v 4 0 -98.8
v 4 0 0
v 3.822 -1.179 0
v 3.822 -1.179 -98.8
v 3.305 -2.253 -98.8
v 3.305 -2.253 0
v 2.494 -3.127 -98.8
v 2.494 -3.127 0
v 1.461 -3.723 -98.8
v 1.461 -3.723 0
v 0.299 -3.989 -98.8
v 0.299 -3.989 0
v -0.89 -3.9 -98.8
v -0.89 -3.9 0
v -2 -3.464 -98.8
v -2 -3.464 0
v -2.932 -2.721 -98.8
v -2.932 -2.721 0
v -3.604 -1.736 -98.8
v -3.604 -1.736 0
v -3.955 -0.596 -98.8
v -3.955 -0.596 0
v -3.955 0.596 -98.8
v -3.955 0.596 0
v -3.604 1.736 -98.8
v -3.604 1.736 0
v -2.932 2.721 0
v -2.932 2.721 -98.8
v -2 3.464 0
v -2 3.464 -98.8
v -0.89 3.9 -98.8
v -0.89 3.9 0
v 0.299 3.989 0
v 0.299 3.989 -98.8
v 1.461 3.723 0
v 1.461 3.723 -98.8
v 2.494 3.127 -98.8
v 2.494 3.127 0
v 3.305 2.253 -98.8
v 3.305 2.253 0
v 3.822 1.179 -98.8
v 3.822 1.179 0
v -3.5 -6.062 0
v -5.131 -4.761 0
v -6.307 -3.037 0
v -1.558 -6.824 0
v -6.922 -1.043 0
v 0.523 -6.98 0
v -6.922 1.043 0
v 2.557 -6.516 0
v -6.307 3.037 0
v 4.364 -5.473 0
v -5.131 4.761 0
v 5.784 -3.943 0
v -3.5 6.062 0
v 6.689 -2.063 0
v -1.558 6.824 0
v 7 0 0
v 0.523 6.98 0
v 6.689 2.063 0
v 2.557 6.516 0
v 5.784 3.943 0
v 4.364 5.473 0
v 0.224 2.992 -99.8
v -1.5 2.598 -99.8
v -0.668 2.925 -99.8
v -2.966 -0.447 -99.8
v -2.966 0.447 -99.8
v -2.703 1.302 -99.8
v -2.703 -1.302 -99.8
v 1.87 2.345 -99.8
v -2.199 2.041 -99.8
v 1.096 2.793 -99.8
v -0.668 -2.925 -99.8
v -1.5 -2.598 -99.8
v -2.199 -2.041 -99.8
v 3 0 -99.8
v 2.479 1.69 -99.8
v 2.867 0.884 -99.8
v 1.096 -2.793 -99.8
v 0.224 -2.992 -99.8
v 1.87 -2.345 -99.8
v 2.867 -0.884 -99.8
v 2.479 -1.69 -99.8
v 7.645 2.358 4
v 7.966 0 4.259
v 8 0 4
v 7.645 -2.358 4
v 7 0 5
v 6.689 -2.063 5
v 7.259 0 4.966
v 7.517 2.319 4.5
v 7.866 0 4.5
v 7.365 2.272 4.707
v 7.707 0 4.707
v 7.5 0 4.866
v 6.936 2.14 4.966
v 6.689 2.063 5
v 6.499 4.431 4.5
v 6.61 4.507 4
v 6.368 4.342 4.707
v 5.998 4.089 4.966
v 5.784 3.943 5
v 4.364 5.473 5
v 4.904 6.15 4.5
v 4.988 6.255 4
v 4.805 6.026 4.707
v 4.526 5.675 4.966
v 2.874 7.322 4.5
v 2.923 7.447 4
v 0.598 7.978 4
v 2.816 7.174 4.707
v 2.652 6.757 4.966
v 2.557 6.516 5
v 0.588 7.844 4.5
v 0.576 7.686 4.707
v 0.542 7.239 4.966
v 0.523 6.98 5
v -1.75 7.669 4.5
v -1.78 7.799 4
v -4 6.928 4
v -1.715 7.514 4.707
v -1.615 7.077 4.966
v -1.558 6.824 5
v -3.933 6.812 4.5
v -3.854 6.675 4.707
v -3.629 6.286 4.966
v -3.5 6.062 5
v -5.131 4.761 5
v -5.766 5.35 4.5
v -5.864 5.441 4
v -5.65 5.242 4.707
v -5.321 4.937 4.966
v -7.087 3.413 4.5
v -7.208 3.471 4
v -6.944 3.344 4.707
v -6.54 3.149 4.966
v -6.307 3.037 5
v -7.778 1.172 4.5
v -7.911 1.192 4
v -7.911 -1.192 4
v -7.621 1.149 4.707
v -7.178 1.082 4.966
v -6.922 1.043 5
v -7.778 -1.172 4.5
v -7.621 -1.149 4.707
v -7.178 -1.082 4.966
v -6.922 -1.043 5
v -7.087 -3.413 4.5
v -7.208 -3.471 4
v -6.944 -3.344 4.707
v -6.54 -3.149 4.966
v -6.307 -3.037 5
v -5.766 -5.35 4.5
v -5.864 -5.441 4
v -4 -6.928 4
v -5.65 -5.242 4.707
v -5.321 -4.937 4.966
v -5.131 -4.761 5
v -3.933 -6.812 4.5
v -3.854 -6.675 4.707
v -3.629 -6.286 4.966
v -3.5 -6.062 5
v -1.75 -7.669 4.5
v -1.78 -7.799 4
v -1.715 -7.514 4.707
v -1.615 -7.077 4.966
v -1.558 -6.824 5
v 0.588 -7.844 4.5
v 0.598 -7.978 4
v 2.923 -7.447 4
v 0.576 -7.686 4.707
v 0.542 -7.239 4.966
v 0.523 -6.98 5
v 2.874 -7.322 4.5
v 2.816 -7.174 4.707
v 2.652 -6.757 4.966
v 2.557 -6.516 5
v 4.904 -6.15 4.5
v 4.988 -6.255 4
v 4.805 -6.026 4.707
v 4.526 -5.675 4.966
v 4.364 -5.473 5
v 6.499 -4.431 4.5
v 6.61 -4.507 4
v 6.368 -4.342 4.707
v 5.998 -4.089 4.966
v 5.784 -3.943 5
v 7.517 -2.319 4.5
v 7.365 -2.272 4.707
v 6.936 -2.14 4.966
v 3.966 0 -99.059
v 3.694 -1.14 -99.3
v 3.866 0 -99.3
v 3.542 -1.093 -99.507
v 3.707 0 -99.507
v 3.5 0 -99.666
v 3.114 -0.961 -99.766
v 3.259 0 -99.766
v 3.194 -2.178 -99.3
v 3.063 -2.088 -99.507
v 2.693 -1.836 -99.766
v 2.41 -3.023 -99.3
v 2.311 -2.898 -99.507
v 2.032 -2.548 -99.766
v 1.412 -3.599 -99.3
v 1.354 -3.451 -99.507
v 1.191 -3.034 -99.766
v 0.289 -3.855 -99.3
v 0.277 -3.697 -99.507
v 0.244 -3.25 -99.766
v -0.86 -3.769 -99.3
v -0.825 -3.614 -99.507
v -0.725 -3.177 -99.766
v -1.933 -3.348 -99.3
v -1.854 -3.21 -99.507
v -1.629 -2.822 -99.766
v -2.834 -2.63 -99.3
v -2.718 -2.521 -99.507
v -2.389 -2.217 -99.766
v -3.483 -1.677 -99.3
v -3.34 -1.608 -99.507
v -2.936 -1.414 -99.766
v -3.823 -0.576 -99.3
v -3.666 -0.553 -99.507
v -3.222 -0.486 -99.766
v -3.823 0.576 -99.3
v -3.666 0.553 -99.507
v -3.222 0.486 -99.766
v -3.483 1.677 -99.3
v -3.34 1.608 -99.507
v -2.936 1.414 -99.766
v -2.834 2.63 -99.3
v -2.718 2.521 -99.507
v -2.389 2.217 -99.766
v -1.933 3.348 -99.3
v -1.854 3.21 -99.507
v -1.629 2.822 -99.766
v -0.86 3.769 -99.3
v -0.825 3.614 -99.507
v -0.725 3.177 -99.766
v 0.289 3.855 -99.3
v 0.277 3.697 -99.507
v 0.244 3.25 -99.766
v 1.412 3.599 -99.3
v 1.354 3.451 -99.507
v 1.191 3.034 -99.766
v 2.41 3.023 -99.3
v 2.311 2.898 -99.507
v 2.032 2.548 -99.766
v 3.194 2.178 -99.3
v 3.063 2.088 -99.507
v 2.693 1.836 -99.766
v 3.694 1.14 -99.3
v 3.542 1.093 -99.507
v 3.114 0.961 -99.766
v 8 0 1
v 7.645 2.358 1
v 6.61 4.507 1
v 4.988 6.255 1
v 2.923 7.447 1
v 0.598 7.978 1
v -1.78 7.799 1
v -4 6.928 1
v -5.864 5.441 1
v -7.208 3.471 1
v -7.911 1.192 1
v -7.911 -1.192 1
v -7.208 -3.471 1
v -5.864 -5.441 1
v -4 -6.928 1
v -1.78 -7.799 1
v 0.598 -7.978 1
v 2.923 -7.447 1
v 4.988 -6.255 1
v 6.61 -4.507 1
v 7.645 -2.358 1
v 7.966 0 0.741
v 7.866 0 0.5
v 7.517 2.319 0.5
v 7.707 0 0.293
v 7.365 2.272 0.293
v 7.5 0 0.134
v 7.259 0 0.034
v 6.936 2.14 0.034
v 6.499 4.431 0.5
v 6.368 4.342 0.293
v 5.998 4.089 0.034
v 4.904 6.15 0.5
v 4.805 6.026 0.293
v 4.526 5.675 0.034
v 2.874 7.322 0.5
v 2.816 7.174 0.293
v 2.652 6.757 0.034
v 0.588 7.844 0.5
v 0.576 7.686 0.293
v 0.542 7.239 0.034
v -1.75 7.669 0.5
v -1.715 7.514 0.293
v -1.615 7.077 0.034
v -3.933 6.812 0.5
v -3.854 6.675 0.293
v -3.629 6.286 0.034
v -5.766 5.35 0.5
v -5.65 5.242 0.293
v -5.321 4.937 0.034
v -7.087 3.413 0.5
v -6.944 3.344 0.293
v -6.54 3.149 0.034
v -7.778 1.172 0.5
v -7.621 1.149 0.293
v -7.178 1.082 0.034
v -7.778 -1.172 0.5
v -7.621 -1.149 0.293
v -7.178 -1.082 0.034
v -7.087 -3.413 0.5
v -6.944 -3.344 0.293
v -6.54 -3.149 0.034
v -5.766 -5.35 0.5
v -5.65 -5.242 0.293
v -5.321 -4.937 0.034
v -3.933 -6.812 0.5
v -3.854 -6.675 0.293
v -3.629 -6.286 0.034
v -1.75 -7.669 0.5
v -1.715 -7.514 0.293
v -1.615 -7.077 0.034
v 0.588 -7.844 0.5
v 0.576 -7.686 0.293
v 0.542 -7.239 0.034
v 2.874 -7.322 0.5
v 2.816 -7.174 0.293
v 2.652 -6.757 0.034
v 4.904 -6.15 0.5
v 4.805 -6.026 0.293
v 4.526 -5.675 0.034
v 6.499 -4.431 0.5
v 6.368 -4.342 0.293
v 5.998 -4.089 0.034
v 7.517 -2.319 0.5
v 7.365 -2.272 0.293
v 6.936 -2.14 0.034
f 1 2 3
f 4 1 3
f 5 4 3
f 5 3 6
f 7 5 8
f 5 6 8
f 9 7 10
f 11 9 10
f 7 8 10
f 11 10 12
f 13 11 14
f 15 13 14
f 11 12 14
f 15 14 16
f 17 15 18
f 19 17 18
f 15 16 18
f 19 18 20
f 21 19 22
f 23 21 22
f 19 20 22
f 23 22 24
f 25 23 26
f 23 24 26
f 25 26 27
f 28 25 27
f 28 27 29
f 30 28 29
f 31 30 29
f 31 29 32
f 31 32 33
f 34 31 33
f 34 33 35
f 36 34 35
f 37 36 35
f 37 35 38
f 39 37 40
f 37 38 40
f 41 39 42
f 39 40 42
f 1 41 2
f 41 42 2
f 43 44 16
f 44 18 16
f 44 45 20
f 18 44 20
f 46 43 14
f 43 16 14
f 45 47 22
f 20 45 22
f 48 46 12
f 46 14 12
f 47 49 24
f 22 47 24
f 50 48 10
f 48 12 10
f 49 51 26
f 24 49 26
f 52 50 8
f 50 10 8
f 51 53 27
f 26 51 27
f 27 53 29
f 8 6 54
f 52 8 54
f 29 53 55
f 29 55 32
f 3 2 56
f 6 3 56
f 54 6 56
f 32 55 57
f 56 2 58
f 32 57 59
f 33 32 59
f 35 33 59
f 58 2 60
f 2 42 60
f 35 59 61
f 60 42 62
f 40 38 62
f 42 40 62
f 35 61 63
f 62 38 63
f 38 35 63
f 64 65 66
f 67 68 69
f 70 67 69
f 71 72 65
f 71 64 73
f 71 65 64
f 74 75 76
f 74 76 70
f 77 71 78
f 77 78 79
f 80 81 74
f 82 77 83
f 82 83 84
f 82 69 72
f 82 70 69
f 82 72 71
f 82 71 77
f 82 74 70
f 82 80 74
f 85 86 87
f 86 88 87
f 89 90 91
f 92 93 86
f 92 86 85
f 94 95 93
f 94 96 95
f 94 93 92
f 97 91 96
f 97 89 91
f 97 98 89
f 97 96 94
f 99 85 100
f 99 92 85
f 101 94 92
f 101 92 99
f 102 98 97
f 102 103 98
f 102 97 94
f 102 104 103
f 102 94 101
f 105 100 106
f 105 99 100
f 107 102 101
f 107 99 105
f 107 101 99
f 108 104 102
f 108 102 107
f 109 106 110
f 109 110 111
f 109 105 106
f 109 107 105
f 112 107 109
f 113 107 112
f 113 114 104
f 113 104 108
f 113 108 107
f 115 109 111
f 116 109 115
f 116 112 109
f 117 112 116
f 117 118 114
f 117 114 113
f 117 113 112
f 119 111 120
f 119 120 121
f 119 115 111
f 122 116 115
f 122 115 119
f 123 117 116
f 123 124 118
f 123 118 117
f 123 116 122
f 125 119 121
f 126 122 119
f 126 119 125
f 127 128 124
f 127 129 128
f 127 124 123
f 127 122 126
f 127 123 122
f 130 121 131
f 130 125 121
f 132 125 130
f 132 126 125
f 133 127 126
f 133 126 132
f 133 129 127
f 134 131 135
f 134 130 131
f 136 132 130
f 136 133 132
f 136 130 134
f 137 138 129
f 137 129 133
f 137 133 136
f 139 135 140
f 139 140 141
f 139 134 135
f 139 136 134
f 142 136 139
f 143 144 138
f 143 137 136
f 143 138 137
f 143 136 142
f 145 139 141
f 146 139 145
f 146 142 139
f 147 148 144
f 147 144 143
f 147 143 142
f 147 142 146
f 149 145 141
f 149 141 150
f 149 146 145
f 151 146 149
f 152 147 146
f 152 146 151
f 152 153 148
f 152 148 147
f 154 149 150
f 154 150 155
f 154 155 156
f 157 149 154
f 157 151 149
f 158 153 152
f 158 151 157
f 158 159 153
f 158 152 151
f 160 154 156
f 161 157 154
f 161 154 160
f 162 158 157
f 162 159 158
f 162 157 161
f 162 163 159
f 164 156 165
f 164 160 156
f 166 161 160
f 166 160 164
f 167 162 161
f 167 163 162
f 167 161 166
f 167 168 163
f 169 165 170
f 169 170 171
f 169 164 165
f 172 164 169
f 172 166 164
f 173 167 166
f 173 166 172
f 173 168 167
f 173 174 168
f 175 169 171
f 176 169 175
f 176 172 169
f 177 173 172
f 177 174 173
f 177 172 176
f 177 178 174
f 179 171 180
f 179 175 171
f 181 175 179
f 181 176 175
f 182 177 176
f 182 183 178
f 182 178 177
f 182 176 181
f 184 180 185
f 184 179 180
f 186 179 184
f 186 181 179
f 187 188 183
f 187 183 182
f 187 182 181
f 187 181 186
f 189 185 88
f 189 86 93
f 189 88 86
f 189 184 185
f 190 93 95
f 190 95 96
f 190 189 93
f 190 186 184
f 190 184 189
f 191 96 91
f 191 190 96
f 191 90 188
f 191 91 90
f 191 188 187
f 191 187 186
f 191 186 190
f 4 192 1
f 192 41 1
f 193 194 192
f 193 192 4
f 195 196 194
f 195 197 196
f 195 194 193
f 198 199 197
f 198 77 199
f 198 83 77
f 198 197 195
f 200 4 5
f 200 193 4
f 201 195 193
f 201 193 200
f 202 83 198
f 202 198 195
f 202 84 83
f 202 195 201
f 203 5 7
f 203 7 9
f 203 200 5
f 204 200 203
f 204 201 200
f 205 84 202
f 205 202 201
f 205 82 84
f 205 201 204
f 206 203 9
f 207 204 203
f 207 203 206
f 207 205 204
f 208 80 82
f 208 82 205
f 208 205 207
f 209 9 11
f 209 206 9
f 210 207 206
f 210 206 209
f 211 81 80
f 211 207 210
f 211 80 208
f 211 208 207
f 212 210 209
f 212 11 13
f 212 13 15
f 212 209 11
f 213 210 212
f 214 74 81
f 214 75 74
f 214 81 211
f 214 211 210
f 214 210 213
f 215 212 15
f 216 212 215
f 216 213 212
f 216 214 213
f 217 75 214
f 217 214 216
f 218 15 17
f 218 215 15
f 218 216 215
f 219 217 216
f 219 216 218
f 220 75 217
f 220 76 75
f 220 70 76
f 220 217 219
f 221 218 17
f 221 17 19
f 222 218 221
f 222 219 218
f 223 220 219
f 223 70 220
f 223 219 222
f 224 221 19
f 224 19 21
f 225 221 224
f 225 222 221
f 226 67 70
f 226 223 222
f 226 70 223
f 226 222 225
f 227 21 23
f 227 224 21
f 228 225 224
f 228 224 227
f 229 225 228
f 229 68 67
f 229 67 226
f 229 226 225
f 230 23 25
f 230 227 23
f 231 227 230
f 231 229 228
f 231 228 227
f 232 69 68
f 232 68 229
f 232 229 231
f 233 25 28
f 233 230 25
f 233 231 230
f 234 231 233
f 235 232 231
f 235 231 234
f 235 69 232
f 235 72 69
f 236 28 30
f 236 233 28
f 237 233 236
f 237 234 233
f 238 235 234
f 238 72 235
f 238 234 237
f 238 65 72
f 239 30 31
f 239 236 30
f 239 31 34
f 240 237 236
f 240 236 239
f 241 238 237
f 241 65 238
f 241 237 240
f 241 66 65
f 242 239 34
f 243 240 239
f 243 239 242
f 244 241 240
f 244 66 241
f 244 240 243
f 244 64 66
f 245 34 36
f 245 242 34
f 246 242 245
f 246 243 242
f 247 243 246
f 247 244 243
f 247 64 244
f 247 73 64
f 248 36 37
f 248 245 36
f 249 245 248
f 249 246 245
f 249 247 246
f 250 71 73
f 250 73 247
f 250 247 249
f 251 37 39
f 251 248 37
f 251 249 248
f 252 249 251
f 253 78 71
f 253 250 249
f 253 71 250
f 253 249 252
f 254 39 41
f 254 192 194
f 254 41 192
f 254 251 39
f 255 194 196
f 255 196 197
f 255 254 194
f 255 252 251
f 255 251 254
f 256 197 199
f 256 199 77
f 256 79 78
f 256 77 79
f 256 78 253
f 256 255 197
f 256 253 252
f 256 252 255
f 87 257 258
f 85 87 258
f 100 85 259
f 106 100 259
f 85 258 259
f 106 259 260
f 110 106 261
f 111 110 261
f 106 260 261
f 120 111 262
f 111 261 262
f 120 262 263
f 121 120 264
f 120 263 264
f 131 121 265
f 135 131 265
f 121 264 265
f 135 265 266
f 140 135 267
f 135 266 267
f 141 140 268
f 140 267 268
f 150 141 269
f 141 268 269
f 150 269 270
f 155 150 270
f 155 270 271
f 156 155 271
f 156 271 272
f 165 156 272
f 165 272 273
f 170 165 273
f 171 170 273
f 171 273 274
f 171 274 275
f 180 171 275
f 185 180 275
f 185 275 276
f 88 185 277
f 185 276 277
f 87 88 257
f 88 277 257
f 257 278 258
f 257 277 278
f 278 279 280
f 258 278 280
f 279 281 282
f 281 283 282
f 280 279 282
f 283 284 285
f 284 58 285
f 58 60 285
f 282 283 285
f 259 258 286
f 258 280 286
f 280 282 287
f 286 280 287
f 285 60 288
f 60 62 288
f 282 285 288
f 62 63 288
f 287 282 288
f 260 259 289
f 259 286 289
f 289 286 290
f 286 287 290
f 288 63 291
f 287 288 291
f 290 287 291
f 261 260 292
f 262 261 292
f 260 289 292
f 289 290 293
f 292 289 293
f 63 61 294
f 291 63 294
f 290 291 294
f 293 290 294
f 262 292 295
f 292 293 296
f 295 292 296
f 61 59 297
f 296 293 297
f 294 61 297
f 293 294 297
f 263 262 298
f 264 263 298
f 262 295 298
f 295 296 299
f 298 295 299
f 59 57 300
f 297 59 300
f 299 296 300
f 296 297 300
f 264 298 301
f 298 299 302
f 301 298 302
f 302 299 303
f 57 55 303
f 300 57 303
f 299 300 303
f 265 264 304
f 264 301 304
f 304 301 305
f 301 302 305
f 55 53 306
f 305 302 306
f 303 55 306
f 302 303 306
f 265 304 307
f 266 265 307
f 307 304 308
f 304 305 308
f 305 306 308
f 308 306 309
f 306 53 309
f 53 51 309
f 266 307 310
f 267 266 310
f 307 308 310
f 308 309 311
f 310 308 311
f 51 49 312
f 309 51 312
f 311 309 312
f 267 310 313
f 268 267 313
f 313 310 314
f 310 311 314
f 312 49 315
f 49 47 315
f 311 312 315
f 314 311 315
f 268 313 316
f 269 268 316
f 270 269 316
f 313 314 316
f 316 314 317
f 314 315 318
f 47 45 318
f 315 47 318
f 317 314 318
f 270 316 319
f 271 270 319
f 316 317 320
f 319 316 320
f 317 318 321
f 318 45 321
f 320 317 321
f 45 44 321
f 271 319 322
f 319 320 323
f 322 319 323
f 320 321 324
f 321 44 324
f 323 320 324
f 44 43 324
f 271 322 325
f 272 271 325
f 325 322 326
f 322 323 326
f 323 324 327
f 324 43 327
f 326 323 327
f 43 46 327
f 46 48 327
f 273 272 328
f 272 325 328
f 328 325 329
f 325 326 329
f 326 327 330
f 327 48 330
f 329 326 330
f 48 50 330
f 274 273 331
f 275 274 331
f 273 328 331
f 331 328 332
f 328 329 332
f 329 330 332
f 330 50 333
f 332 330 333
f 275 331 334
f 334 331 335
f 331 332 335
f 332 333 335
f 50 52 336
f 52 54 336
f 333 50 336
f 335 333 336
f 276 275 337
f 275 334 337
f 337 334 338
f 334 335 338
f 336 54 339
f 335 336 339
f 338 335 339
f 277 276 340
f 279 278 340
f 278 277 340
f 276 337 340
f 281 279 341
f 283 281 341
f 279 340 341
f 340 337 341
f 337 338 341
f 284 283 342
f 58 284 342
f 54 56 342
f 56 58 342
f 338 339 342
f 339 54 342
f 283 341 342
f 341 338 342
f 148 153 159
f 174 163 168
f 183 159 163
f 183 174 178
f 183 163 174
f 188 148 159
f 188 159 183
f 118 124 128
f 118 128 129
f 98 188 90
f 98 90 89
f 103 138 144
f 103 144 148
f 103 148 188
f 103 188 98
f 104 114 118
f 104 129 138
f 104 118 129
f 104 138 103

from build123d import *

# Parameters (mm, degrees)
F0_R     = 8
F1_DEPTH = 5
F2_R     = 4
F3_DEPTH = 99.8
F4_R     = 1


with BuildPart() as f1:
    # F0 (on Top) → F1 (new body)
    with BuildSketch(Plane.XY):
        Circle(F0_R)
    extrude(amount=F1_DEPTH)

    # F2 (on face) → F3 (join)
    with BuildSketch(Plane(origin=(0, 0, 0), x_dir=(1, 0, 0), z_dir=(0, 0, -1))):
        Circle(F2_R)
    extrude(amount=F3_DEPTH)

    # F4
    f4_edges = [f1.edges().sort_by_distance(p)[0] for p in [
        (-4, 0, -99.8),
        (-8, 0, 0),
        (-8, 0, 5),
    ]]
    fillet(f4_edges, radius=F4_R)


solid = f1.part
